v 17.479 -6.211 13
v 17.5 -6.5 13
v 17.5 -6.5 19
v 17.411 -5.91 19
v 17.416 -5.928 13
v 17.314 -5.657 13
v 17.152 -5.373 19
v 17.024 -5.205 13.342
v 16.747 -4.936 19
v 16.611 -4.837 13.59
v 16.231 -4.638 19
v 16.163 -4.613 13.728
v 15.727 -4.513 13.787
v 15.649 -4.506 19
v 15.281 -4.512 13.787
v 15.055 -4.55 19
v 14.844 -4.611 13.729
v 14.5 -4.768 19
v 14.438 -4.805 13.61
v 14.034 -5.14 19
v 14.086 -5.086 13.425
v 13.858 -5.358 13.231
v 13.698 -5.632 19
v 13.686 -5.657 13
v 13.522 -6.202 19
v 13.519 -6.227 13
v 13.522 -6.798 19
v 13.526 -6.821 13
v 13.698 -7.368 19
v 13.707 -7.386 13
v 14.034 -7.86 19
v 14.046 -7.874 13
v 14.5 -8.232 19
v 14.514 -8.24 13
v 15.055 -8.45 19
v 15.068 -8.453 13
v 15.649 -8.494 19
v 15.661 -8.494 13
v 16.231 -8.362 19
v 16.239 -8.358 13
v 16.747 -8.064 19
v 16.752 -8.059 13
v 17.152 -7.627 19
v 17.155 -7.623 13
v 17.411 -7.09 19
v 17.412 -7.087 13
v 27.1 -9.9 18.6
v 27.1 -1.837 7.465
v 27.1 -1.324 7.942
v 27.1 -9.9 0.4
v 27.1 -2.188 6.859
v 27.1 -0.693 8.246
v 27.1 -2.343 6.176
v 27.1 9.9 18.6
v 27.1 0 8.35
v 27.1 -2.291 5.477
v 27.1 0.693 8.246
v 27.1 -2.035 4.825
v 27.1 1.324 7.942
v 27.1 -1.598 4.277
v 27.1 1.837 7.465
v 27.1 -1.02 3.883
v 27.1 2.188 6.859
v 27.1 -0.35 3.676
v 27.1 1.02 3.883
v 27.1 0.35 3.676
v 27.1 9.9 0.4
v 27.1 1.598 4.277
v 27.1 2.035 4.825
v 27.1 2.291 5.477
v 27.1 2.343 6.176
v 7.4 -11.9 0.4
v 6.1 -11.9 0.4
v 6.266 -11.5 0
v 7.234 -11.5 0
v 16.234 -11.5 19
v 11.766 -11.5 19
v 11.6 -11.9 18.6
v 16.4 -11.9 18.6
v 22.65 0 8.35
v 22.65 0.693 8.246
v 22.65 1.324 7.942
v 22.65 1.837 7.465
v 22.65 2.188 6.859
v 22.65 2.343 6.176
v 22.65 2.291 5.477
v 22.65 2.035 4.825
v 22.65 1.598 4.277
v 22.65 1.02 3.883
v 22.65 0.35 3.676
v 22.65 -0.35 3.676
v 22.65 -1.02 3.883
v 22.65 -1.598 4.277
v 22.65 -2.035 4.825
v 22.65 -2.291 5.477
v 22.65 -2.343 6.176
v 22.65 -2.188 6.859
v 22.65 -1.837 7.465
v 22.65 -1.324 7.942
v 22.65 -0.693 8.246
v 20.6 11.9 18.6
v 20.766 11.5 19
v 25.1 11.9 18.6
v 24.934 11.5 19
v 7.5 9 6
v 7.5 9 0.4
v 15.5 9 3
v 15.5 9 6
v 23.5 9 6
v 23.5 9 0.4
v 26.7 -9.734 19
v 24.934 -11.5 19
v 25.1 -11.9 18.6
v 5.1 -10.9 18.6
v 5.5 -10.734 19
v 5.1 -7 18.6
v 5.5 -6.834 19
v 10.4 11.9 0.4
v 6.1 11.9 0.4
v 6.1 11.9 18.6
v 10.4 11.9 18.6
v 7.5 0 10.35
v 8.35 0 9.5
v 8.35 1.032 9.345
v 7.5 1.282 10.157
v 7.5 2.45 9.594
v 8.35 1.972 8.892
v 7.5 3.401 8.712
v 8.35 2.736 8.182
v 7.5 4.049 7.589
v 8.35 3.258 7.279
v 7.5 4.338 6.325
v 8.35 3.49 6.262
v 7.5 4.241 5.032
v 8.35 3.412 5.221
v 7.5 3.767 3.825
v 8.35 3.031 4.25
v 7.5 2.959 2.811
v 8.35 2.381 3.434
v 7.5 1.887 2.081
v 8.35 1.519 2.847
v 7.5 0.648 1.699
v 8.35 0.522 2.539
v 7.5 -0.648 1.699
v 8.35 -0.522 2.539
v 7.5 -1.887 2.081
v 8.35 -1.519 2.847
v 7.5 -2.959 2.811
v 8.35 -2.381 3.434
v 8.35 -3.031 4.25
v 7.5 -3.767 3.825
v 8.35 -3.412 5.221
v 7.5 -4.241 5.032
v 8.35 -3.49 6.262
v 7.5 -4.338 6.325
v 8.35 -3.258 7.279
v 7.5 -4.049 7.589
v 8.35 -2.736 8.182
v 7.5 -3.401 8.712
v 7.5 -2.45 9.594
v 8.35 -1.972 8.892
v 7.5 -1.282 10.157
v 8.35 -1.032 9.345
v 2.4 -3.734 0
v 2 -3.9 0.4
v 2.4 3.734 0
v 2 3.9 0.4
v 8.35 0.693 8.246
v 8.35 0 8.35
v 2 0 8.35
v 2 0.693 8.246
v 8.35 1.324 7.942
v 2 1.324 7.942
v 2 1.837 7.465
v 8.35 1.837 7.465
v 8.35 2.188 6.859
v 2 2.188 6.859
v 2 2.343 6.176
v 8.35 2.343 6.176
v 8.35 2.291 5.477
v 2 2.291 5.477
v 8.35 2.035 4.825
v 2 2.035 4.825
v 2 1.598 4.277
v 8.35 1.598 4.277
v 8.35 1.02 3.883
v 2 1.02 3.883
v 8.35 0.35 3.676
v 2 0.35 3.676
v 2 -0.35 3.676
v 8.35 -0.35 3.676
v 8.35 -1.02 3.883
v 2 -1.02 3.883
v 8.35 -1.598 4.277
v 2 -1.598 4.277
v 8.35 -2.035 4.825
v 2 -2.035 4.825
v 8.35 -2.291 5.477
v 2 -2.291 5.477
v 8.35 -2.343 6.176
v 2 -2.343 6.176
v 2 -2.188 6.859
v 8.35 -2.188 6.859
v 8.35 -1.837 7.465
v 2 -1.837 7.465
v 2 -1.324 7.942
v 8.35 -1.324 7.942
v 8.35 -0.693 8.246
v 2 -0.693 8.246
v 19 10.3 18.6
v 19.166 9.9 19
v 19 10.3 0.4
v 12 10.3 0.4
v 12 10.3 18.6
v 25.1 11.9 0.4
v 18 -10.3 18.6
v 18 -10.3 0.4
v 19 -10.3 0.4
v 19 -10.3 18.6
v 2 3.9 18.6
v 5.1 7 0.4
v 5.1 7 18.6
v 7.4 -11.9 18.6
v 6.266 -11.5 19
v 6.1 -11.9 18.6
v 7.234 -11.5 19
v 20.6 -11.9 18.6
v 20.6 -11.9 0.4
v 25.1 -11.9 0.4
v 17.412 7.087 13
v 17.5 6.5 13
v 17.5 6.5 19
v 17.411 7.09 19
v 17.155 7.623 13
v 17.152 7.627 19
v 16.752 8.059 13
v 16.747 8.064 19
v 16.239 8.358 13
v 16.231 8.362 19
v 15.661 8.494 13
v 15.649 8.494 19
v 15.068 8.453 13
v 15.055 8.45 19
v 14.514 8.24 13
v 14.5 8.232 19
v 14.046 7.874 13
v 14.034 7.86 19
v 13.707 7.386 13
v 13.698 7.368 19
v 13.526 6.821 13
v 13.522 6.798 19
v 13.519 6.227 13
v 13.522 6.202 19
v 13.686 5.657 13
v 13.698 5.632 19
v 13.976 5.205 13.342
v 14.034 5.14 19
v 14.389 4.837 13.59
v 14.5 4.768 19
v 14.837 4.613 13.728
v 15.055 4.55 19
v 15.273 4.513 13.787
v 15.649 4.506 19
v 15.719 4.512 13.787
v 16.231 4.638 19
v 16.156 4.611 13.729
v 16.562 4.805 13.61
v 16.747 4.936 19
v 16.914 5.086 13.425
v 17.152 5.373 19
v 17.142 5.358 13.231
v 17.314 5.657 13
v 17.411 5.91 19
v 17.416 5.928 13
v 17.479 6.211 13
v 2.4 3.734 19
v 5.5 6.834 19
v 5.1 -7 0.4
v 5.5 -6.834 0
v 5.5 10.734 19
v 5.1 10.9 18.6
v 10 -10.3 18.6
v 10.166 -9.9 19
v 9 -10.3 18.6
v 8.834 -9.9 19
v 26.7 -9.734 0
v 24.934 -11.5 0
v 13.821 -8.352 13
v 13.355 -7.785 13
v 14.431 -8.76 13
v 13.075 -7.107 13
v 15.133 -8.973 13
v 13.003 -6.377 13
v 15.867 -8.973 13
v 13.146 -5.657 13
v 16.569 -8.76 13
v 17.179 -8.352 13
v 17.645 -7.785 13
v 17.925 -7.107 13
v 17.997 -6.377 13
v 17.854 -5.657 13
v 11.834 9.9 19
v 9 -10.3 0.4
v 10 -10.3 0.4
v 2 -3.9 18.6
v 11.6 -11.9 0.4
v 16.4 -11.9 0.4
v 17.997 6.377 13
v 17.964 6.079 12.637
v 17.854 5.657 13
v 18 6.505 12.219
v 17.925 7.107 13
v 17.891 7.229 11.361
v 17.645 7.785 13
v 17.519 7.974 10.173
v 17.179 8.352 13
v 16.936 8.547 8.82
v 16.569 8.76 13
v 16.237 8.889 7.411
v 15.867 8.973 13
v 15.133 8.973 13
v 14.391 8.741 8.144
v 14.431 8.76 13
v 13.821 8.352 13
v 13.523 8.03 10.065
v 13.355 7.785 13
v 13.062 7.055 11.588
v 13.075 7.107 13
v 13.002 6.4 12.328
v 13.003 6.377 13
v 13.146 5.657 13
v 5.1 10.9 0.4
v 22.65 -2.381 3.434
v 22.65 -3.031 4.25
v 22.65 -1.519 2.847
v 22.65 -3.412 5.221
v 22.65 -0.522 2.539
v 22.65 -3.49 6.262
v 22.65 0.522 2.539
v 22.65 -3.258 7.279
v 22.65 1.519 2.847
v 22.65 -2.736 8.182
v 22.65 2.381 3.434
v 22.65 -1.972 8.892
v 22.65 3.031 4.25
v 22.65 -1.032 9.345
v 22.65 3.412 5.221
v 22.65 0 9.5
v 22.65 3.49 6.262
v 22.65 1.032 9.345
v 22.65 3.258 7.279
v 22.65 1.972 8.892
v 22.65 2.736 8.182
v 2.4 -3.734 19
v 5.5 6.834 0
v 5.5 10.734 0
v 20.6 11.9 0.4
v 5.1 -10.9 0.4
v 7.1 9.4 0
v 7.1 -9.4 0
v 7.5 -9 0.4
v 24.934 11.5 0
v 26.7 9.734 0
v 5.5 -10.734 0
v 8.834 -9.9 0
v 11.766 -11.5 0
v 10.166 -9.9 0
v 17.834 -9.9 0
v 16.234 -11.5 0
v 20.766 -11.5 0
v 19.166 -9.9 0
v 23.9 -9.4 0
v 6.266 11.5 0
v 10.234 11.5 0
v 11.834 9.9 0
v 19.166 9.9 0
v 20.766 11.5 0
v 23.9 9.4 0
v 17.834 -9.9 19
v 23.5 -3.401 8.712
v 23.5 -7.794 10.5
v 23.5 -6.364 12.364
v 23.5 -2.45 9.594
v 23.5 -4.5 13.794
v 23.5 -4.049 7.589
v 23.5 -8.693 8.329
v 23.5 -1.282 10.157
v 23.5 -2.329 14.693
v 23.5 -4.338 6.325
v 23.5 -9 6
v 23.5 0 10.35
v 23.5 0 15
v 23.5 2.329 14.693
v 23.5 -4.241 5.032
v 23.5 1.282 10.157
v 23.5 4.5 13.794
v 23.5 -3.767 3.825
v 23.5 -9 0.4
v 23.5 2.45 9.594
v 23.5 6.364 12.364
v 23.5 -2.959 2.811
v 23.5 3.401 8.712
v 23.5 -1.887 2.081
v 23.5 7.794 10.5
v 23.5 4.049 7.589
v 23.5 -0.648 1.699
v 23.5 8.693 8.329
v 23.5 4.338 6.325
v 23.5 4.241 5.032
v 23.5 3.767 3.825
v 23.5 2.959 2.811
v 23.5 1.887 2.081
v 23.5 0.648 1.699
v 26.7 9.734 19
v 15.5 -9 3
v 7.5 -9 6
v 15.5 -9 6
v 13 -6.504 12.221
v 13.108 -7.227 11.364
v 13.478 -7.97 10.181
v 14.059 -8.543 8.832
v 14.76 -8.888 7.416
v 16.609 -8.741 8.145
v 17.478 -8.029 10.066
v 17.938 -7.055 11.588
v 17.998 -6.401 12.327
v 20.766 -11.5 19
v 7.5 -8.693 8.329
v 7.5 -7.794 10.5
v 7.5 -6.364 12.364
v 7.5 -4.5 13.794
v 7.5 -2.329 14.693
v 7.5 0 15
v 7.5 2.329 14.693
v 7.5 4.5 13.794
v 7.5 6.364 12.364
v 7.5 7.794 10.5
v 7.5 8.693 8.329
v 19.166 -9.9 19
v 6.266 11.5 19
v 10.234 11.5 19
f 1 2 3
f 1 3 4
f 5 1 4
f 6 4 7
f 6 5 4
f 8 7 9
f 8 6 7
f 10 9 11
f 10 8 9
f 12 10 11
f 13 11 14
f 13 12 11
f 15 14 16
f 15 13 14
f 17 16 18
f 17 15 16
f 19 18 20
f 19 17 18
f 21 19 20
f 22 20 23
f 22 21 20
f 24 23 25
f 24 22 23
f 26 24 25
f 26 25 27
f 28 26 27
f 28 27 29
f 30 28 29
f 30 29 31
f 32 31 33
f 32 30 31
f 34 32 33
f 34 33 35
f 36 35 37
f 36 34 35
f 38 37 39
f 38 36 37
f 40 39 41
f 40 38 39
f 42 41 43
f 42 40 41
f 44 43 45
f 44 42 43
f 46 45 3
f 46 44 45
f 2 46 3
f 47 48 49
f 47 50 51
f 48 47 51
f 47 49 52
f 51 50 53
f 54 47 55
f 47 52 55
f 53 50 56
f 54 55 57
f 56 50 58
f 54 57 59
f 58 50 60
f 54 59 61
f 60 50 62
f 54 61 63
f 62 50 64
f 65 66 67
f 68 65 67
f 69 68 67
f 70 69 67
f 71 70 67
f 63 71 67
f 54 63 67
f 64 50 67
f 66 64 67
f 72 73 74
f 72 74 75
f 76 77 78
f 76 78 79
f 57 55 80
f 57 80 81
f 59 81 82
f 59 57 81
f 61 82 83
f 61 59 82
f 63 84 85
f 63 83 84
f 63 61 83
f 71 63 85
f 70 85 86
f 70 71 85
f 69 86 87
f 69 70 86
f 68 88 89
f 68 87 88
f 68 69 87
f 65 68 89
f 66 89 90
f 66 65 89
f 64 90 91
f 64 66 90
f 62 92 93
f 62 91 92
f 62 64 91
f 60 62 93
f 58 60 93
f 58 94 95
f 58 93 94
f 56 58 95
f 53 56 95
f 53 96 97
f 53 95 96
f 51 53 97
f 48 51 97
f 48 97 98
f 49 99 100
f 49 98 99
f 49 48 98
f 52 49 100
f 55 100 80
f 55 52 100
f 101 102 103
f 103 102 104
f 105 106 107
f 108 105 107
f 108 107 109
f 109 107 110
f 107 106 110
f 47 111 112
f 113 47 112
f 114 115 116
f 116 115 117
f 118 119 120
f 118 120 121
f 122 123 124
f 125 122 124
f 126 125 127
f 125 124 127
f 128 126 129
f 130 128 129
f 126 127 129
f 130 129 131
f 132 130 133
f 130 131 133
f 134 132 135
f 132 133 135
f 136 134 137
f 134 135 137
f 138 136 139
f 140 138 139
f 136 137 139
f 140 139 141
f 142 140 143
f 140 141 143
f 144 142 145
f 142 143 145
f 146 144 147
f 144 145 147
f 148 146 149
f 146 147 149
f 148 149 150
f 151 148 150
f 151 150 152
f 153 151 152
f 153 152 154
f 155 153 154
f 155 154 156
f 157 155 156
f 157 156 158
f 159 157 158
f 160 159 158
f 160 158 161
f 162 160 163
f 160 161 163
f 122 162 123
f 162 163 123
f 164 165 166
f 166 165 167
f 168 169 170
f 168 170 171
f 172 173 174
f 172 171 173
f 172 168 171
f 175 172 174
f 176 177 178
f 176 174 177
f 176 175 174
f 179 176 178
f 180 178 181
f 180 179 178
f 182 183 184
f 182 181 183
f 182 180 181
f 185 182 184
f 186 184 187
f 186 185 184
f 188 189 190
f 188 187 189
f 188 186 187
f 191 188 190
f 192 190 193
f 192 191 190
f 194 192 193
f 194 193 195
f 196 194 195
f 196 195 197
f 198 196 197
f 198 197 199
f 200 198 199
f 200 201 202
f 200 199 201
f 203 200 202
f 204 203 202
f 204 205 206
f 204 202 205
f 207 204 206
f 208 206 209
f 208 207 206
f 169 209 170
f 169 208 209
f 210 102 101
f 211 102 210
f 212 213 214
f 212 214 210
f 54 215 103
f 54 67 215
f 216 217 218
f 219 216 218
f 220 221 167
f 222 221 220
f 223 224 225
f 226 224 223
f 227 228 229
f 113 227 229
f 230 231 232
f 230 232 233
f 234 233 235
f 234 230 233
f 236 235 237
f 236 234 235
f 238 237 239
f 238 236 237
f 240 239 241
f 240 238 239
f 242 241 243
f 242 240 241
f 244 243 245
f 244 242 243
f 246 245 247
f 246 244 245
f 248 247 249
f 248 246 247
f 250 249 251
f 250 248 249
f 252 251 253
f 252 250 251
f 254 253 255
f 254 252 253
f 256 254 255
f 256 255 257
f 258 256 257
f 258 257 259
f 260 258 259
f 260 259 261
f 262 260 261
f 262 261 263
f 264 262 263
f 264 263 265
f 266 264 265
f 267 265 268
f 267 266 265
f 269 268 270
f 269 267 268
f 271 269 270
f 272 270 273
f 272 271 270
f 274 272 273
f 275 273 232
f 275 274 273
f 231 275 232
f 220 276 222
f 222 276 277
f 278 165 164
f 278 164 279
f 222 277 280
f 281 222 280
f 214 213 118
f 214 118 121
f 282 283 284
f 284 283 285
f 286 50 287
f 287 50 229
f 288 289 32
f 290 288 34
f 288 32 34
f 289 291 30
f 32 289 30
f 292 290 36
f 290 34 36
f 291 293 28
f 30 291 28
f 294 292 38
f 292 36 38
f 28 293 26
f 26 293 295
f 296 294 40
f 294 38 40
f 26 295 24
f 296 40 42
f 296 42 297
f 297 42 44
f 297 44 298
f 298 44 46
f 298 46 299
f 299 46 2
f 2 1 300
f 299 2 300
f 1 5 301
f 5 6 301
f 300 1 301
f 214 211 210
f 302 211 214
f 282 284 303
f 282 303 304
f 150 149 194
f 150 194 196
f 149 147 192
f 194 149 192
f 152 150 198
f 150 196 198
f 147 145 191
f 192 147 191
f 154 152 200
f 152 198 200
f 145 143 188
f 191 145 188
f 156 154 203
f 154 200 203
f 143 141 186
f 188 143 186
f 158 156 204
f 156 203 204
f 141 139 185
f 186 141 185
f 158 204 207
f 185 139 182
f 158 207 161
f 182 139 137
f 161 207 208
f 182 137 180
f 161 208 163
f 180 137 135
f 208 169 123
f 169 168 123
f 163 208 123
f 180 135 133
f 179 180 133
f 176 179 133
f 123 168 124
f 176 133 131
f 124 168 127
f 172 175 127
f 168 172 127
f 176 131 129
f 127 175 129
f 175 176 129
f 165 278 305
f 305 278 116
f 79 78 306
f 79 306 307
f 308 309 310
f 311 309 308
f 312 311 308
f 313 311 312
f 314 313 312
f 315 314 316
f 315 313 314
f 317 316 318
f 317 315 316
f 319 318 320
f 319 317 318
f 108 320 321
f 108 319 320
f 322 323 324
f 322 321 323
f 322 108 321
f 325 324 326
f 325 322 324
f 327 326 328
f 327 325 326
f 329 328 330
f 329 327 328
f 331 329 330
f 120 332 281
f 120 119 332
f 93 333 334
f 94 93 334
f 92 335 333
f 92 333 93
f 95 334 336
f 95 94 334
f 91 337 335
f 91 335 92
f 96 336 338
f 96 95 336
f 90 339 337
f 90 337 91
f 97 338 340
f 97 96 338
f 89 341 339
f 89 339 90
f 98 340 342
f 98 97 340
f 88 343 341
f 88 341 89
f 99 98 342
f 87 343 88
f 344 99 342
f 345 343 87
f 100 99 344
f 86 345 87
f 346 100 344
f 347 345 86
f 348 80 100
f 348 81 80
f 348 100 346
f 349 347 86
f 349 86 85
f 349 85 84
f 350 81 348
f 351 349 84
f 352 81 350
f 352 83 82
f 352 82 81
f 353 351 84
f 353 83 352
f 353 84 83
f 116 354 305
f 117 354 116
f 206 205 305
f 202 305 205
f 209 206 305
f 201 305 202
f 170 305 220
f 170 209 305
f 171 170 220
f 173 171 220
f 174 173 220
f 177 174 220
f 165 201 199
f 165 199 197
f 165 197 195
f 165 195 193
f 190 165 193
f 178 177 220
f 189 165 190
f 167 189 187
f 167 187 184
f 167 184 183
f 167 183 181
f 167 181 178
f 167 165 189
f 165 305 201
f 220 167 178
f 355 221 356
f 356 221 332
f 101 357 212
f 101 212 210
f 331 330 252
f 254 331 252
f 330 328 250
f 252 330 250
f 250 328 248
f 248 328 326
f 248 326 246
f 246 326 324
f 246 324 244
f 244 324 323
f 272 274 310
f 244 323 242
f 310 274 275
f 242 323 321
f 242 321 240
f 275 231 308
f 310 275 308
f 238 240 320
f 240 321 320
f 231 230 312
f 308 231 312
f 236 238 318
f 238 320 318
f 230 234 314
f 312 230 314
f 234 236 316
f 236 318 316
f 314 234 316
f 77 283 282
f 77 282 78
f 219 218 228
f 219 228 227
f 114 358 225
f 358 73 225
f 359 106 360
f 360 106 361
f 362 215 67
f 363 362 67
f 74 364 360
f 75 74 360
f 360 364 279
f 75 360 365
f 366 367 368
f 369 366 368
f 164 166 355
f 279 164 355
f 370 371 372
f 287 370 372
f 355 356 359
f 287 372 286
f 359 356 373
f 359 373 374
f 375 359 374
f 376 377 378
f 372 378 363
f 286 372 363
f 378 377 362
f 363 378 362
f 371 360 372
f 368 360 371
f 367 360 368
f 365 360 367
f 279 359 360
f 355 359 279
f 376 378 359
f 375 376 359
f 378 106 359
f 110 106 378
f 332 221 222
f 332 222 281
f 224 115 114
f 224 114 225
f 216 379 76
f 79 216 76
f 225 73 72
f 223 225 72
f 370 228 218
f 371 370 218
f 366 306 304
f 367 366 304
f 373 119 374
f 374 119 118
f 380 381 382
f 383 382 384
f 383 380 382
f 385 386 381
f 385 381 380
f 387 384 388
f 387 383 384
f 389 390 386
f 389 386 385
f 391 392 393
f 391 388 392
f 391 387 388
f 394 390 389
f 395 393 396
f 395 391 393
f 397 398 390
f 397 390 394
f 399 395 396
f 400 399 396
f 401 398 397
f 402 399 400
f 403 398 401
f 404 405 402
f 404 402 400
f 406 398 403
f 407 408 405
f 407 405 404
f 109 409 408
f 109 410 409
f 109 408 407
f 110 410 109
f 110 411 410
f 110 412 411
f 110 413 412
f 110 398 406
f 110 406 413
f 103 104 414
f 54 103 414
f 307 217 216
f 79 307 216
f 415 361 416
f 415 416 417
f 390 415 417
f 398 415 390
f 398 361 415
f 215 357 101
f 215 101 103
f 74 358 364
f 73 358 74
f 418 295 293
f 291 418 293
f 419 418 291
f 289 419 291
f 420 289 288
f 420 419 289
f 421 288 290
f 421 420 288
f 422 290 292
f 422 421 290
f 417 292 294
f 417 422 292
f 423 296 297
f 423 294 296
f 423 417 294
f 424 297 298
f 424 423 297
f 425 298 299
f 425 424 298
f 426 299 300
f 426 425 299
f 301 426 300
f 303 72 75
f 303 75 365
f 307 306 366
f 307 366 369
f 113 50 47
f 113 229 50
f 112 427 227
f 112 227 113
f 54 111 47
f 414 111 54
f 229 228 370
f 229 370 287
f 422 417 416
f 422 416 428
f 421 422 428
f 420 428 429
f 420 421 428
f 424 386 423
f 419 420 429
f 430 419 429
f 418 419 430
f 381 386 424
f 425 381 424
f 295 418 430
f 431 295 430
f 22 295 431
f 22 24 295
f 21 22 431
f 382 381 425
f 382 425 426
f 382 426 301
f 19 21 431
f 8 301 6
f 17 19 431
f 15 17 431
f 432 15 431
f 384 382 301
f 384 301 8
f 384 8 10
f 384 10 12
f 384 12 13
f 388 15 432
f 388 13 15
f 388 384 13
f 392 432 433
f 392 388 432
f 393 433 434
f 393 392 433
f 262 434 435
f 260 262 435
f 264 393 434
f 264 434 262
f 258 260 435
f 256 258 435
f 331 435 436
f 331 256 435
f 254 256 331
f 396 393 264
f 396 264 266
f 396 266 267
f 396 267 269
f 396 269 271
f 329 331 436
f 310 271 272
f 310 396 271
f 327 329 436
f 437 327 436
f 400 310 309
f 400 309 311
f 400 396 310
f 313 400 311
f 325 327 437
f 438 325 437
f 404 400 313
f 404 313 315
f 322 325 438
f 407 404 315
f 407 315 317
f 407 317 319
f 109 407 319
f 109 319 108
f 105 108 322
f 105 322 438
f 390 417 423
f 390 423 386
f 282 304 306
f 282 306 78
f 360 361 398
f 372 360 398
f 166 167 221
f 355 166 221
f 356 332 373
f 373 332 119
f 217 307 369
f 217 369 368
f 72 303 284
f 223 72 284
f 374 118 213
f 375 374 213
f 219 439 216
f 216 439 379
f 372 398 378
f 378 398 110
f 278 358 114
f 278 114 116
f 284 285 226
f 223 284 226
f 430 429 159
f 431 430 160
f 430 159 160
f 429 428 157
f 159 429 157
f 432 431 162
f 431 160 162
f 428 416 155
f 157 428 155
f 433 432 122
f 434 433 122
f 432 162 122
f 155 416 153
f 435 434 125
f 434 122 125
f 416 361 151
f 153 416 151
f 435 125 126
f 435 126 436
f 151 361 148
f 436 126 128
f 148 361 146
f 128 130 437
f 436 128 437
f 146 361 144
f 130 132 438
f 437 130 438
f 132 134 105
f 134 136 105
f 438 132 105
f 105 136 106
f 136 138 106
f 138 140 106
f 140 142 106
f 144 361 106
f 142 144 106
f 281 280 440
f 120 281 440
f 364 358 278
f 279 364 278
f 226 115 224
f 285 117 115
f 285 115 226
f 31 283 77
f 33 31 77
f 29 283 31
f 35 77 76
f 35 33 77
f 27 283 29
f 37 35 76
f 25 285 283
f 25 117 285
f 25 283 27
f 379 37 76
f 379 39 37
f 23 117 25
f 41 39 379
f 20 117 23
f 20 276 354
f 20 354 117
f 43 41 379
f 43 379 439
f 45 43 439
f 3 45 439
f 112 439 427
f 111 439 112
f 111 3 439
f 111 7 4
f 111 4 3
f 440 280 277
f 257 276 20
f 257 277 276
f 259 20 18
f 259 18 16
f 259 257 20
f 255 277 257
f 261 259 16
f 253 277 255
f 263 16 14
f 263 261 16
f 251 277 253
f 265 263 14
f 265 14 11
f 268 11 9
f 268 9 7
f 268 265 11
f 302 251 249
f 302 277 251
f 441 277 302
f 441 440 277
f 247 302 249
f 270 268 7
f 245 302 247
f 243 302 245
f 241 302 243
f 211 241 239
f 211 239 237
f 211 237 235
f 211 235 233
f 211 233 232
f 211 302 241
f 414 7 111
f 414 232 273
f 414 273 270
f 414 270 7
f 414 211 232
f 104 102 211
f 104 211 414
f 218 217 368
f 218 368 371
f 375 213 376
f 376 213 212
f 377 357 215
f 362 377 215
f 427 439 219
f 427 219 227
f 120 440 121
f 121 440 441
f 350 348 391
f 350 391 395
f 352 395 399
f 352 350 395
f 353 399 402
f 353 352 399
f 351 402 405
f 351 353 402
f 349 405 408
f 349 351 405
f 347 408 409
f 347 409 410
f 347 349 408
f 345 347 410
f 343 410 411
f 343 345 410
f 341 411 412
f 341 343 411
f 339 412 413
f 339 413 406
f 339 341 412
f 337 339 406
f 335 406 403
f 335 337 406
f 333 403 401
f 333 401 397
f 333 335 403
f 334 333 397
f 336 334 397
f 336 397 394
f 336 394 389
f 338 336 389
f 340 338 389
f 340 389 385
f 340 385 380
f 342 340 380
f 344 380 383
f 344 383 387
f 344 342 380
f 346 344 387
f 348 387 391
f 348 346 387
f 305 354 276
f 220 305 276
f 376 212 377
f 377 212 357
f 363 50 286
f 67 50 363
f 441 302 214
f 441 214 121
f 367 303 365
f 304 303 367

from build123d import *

# Parameters (mm, degrees)
CYLINDER015_R         = 2.35
CYLINDER015_DEPTH     = 33
CYLINDER016_R         = 4.35
CYLINDER016_DEPTH     = 1
CYLINDER017_R         = 4.35
CYLINDER017_DEPTH     = 1
CHAMFER003036_SIZE    = 0.85
CYLINDER021_R         = 2.5
CYLINDER021_DEPTH     = 10
CYLINDER019_R         = 2
CYLINDER019_DEPTH     = 10
CYLINDER018_R         = 2
CYLINDER018_DEPTH     = 10
CYLINDER020_R         = 2.5
CYLINDER020_DEPTH     = 10
BOX011_W              = 16
BOX011_H              = 18
BOX011_DEPTH          = 6
CYLINDER014_R         = 9
CYLINDER014_DEPTH     = 16
BOX014_W              = 4.2
BOX014_H              = 10
BOX014_DEPTH          = 22
BOX025_W              = 4.2
BOX025_H              = 10
BOX025_DEPTH          = 22
BOX013_W              = 10.2
BOX013_H              = 10
BOX013_DEPTH          = 22
CHAMFER003068003_SIZE = 1.6
BOX012_W              = 22
BOX012_H              = 23.8
BOX012_DEPTH          = 19
CHAMFER003068004_SIZE = 1
CHAMFER003068005_SIZE = 2
BOX037_W              = 5
BOX037_H              = 14
BOX037_DEPTH          = 19
CHAMFER003068011_SIZE = 3.1
CHAMFER003068012_SIZE = 0.4


with BuildPart() as cylinder015:
    # Cylinder015 → Cylinder015 (new body)
    with BuildSketch(Plane(origin=(31, 0, 6), x_dir=(0, 0, 1), z_dir=(-1, 0, 0))):
        Circle(CYLINDER015_R)
    extrude(amount=CYLINDER015_DEPTH)


with BuildPart() as cylinder016:
    # Cylinder016 → Cylinder016 (new body)
    with BuildSketch(Plane(origin=(23.15, 0, 6), x_dir=(0, 0, 1), z_dir=(-1, 0, 0))):
        Circle(CYLINDER016_R)
    extrude(amount=CYLINDER016_DEPTH)


with BuildPart() as chamfer003036:
    # Cylinder017 → Cylinder017 (new body)
    with BuildSketch(Plane(origin=(7.85, 0, 6), x_dir=(0, 0, 1), z_dir=(-1, 0, 0))):
        Circle(CYLINDER017_R)
    extrude(amount=CYLINDER017_DEPTH)

    # Fusion013005011005: union Cylinder016
    add(cylinder016.part)

    # Chamfer003036
    chamfer003036_edges = [chamfer003036.edges().sort_by_distance(p)[0] for p in [
        (7.85, 0, 1.65),
        (22.15, 0, 1.65),
    ]]
    chamfer(chamfer003036_edges, length=CHAMFER003036_SIZE)


with BuildPart() as cylinder021:
    # Cylinder021 → Cylinder021 (new body)
    with BuildSketch(Plane(origin=(15, 6.5, 3), x_dir=(1, 0, 0), z_dir=(0, 0, 1))):
        Circle(CYLINDER021_R)
    extrude(amount=CYLINDER021_DEPTH)


with BuildPart() as cylinder019:
    # Cylinder019 → Cylinder019 (new body)
    with BuildSketch(Plane(origin=(15, 6.5, 13), x_dir=(1, 0, 0), z_dir=(0, 0, 1))):
        Circle(CYLINDER019_R)
    extrude(amount=CYLINDER019_DEPTH)


with BuildPart() as fusion013005011029006008001003:
    # Cylinder018 → Cylinder018 (new body)
    with BuildSketch(Plane(origin=(15, -6.5, 13), x_dir=(1, 0, 0), z_dir=(0, 0, 1))):
        Circle(CYLINDER018_R)
    extrude(amount=CYLINDER018_DEPTH)

    # Fusion013005011029006008001003: union Cylinder019
    add(cylinder019.part)


with BuildPart() as cylinder020:
    # Cylinder020 → Cylinder020 (new body)
    with BuildSketch(Plane(origin=(15, -6.5, 3), x_dir=(1, 0, 0), z_dir=(0, 0, 1))):
        Circle(CYLINDER020_R)
    extrude(amount=CYLINDER020_DEPTH)


with BuildPart() as fusion013005011029006008001004:
    # Fusion013005011029006008001004 base: copy of Cylinder020
    add(cylinder020.part)

    # Fusion013005011029006008001004: union Cylinder021
    add(cylinder021.part)


with BuildPart() as fusion013005011029006008001005:
    # Fusion013005011029006008001005 base: copy of Cylinder020
    add(cylinder020.part)

    # Fusion013005011029006008001005: union Cylinder021, Fusion013005011029006008001003, Fusion013005011029006008001004
    add(cylinder021.part)
    add(fusion013005011029006008001003.part)
    add(fusion013005011029006008001004.part)


with BuildPart() as cube011:
    # Box011 → Box011 (new body)
    with BuildSketch(Plane(origin=(7, -9, 0), x_dir=(1, 0, 0), z_dir=(0, 0, 1))):
        with Locations((8, 9)):
            Rectangle(BOX011_W, BOX011_H)
    extrude(amount=BOX011_DEPTH)


with BuildPart() as fusion013005011004:
    # Cylinder014 → Cylinder014 (new body)
    with BuildSketch(Plane(origin=(23, 0, 6), x_dir=(0, 0, 1), z_dir=(-1, 0, 0))):
        Circle(CYLINDER014_R)
    extrude(amount=CYLINDER014_DEPTH)

    # Fusion013005011004: union Cube011
    add(cube011.part)


with BuildPart() as cube014:
    # Box014 → Box014 (new body)
    with BuildSketch(Plane(origin=(6.9, -20.3, 0), x_dir=(1, 0, 0), z_dir=(0, 0, 1))):
        with Locations((2.1, 5)):
            Rectangle(BOX014_W, BOX014_H)
    extrude(amount=BOX014_DEPTH)


with BuildPart() as cube023:
    # Box025 → Box025 (new body)
    with BuildSketch(Plane(origin=(15.9, -20.3, 0), x_dir=(1, 0, 0), z_dir=(0, 0, 1))):
        with Locations((2.1, 5)):
            Rectangle(BOX025_W, BOX025_H)
    extrude(amount=BOX025_DEPTH)


with BuildPart() as chamfer003068003:
    # Box013 → Box013 (new body)
    with BuildSketch(Plane(origin=(9.9, 10.3, 0), x_dir=(1, 0, 0), z_dir=(0, 0, 1))):
        with Locations((5.1, 5)):
            Rectangle(BOX013_W, BOX013_H)
    extrude(amount=BOX013_DEPTH)

    # Fusion013005011029006008001002: union Cube014, Cube023
    add(cube014.part)
    add(cube023.part)

    # Chamfer003068003
    chamfer003068003_edges = [chamfer003068003.edges().sort_by_distance(p)[0] for p in [
        (9.9, 10.3, 11),
        (20.1, 10.3, 11),
        (6.9, -10.3, 11),
        (11.1, -10.3, 11),
        (15.9, -10.3, 11),
        (20.1, -10.3, 11),
    ]]
    chamfer(chamfer003068003_edges, length=CHAMFER003068003_SIZE)


with BuildPart() as chamfer003068005:
    # Box012 → Box012 (new body)
    with BuildSketch(Plane(origin=(4.6, -11.9, 0), x_dir=(1, 0, 0), z_dir=(0, 0, 1))):
        with Locations((11, 11.9)):
            Rectangle(BOX012_W, BOX012_H)
    extrude(amount=BOX012_DEPTH)

    # Cut001001036003: cut Chamfer003068003
    add(chamfer003068003.part, mode=Mode.SUBTRACT)

    # Cut001001036004: cut Fusion013005011004
    add(fusion013005011004.part, mode=Mode.SUBTRACT)

    # Cut001001036005: cut Fusion013005011029006008001005
    add(fusion013005011029006008001005.part, mode=Mode.SUBTRACT)

    # Fusion013005011029006008001006: union Chamfer003036
    add(chamfer003036.part)

    # Chamfer003068004
    chamfer003068004_edges = [chamfer003068005.edges().sort_by_distance(p)[0] for p in [
        (4.6, -11.9, 9.5),
        (4.6, 11.9, 9.5),
    ]]
    chamfer(chamfer003068004_edges, length=CHAMFER003068004_SIZE)

    # Chamfer003068005
    chamfer003068005_edges = [chamfer003068005.edges().sort_by_distance(p)[0] for p in [
        (26.6, 11.9, 9.5),
        (26.6, -11.9, 9.5),
    ]]
    chamfer(chamfer003068005_edges, length=CHAMFER003068005_SIZE)


with BuildPart() as chamfer003068005_1:
    # Chamfer003068005 placement: moved
    add(chamfer003068005.part.moved(Location((0.5, 0, 0))))


with BuildPart() as chamfer003068012:
    # Box037 → Box037 (new body)
    with BuildSketch(Plane(origin=(2, -7, 0), x_dir=(1, 0, 0), z_dir=(0, 0, 1))):
        with Locations((2.5, 7)):
            Rectangle(BOX037_W, BOX037_H)
    extrude(amount=BOX037_DEPTH)

    # Chamfer003068011
    chamfer003068011_edges = [chamfer003068012.edges().sort_by_distance(p)[0] for p in [
        (2, -7, 9.5),
        (2, 7, 9.5),
    ]]
    chamfer(chamfer003068011_edges, length=CHAMFER003068011_SIZE)

    # Fusion013005011029006008001009: union Chamfer003068005
    add(chamfer003068005_1.part)

    # Cut001001036010002: cut Cylinder015
    add(cylinder015.part, mode=Mode.SUBTRACT)

    # Chamfer003068012
    chamfer003068012_edges = [chamfer003068012.edges().sort_by_distance(p)[0] for p in [
        (2, 0, 19),
        (2, 0, 0),
        (3.55, -5.45, 0),
        (3.55, -5.45, 19),
        (3.55, 5.45, 0),
        (3.55, 5.45, 19),
        (5.1, -8.95, 19),
        (5.1, -8.95, 0),
        (5.1, 8.95, 19),
        (5.1, 8.95, 0),
        (5.6, -11.4, 0),
        (5.6, -11.4, 19),
        (5.6, 11.4, 0),
        (5.6, 11.4, 19),
        (6.75, -11.9, 0),
        (6.75, -11.9, 19),
        (22.85, -11.9, 0),
        (22.85, -11.9, 19),
        (19.8, -11.1, 0),
        (19.8, -11.1, 19),
        (18.5, -10.3, 0),
        (18.5, -10.3, 19),
        (17.2, -11.1, 0),
        (17.2, -11.1, 19),
        (14, -11.9, 0),
        (14, -11.9, 19),
        (10.8, -11.1, 0),
        (10.8, -11.1, 19),
        (9.5, -10.3, 0),
        (9.5, -10.3, 19),
        (8.2, -11.1, 0),
        (8.2, -11.1, 19),
        (8.25, 11.9, 0),
        (8.25, 11.9, 19),
        (11.2, 11.1, 0),
        (11.2, 11.1, 19),
        (15.5, 10.3, 0),
        (15.5, 10.3, 19),
        (19.8, 11.1, 0),
        (19.8, 11.1, 19),
        (22.85, 11.9, 0),
        (22.85, 11.9, 19),
        (26.1, 10.9, 0),
        (26.1, 10.9, 19),
        (27.1, 0, 19),
        (27.1, 0, 0),
        (26.1, -10.9, 0),
        (26.1, -10.9, 19),
        (23.5, 0, 0),
        (15.5, 9, 0),
        (7.5, 0, 0),
        (15.5, -9, 0),
    ]]
    chamfer(chamfer003068012_edges, length=CHAMFER003068012_SIZE)


solid = chamfer003068012.part
